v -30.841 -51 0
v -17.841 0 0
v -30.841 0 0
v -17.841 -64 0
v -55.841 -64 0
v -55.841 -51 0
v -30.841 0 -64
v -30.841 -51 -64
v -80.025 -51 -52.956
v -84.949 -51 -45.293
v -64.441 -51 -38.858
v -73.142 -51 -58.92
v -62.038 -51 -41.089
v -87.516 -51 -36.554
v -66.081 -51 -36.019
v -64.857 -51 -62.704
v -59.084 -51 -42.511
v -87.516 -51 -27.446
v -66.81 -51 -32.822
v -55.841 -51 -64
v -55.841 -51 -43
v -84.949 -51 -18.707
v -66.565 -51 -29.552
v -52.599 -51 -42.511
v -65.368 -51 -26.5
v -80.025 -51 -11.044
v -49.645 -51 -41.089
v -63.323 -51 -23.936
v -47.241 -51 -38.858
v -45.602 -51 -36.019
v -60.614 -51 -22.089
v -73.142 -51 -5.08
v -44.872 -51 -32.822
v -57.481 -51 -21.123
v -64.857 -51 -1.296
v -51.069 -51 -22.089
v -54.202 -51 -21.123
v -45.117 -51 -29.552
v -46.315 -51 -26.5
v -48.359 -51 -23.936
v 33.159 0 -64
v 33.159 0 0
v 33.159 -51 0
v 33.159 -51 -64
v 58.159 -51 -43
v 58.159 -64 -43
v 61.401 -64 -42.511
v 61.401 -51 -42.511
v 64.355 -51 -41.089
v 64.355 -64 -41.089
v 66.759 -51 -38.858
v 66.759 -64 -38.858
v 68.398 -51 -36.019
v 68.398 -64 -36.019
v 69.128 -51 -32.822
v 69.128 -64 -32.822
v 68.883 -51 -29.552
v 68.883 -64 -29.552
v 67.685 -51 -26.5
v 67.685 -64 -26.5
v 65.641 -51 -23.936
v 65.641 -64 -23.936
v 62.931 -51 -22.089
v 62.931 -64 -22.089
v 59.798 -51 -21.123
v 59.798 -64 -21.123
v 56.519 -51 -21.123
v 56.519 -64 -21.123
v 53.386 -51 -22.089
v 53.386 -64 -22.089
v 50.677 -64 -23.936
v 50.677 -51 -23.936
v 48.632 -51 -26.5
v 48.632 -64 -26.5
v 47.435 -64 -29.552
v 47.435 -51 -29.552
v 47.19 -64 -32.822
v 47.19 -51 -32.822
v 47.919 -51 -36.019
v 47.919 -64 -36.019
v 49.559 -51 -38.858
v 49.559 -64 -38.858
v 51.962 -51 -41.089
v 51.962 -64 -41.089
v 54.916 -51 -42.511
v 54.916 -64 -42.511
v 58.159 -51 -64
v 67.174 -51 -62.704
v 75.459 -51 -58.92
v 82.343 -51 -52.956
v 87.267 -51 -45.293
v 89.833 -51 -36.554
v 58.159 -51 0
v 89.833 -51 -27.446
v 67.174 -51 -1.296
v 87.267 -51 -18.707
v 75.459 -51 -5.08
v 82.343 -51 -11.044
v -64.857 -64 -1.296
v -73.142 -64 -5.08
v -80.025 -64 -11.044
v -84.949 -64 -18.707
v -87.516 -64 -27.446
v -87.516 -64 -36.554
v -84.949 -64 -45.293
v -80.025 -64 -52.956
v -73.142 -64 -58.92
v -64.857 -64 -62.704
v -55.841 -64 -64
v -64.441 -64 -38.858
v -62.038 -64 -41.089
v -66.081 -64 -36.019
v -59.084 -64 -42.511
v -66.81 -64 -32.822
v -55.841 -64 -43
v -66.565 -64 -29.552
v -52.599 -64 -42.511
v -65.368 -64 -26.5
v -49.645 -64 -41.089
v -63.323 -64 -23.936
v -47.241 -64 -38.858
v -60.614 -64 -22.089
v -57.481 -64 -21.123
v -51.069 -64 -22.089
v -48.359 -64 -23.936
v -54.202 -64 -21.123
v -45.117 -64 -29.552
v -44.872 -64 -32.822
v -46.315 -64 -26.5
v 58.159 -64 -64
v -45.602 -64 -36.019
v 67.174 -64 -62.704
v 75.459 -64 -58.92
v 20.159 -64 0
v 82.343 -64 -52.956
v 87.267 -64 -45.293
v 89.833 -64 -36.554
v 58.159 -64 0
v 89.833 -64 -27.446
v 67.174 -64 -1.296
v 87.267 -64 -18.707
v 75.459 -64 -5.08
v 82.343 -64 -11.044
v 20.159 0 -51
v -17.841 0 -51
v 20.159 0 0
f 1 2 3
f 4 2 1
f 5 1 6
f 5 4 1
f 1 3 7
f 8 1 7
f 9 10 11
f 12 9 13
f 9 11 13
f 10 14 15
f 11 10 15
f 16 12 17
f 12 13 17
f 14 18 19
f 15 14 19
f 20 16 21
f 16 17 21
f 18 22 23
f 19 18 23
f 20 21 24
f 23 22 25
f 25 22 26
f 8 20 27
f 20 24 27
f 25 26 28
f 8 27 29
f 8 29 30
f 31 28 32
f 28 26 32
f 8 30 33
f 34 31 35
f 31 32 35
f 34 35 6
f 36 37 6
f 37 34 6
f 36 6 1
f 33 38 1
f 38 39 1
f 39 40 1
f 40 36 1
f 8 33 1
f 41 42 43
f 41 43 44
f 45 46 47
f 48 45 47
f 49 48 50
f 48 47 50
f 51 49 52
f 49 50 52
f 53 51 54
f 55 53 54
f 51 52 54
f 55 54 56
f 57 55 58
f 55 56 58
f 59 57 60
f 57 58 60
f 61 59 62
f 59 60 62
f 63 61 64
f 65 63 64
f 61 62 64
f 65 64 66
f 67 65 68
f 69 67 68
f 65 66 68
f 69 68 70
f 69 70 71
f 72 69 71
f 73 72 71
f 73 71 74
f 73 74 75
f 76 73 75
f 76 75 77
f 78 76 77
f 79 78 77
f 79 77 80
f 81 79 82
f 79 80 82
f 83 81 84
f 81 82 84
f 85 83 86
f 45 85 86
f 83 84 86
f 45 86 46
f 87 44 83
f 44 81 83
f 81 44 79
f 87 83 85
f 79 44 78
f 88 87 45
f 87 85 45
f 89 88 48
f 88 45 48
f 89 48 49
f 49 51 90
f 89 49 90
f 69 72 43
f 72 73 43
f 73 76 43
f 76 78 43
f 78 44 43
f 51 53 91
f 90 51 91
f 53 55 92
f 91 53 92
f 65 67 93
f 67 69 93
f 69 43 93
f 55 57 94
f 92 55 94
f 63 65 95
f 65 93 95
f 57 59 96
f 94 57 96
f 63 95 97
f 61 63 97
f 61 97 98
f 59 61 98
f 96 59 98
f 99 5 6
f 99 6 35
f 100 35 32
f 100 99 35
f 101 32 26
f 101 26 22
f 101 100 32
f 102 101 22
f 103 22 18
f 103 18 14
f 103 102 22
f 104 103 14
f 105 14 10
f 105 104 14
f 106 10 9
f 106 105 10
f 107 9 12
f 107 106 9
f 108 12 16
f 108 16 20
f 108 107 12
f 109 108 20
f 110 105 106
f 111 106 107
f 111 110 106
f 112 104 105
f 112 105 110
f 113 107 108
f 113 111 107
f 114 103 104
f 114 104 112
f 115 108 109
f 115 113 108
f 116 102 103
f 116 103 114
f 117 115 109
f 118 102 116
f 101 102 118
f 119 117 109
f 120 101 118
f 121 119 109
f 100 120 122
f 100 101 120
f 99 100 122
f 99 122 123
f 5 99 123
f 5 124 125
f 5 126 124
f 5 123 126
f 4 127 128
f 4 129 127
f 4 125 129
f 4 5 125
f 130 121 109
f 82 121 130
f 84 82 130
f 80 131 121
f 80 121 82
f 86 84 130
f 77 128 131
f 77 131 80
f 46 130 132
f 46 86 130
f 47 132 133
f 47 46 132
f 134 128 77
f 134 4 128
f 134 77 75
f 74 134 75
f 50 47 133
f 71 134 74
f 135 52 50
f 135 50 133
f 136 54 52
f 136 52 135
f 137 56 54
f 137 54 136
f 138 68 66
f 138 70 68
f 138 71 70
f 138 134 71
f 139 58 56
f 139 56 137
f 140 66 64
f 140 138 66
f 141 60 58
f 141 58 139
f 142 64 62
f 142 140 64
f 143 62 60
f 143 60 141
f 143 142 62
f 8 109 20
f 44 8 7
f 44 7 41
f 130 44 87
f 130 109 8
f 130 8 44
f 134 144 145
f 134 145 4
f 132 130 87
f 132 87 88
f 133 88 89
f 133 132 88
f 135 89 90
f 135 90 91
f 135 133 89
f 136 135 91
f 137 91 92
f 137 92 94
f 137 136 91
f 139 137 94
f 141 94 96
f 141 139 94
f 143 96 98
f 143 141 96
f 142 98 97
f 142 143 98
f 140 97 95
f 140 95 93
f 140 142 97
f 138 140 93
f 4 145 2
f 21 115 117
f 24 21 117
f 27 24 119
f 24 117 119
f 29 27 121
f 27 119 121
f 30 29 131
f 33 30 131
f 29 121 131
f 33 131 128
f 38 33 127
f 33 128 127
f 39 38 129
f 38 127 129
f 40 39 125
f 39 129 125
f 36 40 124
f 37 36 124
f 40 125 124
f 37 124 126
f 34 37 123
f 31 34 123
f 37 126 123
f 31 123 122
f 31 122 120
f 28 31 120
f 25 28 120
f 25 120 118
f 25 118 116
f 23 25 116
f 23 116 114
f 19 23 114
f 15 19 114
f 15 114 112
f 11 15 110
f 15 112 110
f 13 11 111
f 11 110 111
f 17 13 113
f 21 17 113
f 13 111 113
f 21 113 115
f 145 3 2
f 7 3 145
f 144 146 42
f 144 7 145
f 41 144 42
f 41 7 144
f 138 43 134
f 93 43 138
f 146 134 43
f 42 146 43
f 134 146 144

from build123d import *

# Parameters (mm, degrees)
SKETCH1_W               = 64
SKETCH1_H               = 64
BOSS_EXTRUDE1_DEPTH     = 64
CUT_EXTRUDE2_DEPTH      = 97.392449486
CUT_EXTRUDE2_DEPTH_BACK = 64
BOSS_EXTRUDE3_DEPTH     = 64
SKETCH10_R              = 11
BOSS_EXTRUDE4_DEPTH     = 13


with BuildPart() as part:
    # Sketch1 → Boss-Extrude1 (new body)
    with BuildSketch(Plane(origin=(0, 0, 0), x_dir=(1, 0, 0), z_dir=(0, 1, 0))):
        with Locations((1.158774373, 32)):
            Rectangle(SKETCH1_W, SKETCH1_H)
    extrude(amount=-BOSS_EXTRUDE1_DEPTH)

    # Sketch4 → Cut-Extrude2 (cut, two sides: drawn at the far end of the back side and taken through both)
    with BuildSketch(Plane(origin=(0, 0, 0), x_dir=(1, 0, 0), z_dir=(0, 1, 0)).offset(-CUT_EXTRUDE2_DEPTH_BACK)):
        Polygon((20.158774373, -173.670400501), (20.158774373, 0), (20.158774373, 51), (-17.841225627, 51), (-17.841225627, 0), (-17.841225627, -173.670400501), (-17.841225627, -521.011201502), (20.158774373, -521.011201502), align=None)
    extrude(amount=CUT_EXTRUDE2_DEPTH + CUT_EXTRUDE2_DEPTH_BACK, mode=Mode.SUBTRACT)

    # Sketch8 → Boss-Extrude3 (add)
    with BuildSketch(Plane(origin=(33.158774373, 0, 0), x_dir=(0, 0, -1), z_dir=(1, 0, 0))):
        Polygon((51, 0), (0, -64), (51, -64), align=None)
    extrude(amount=-BOSS_EXTRUDE3_DEPTH)

    # Sketch10 → Boss-Extrude4 (add)
    # profile 1 of 2: a face of its own
    with BuildSketch(Plane.XZ.offset(64)):
        with BuildLine():
            Line((-30.841225627, 0), (-55.841225627, 0))
            ThreePointArc((-55.841225627, 0), (-87.841225627, -32), (-55.841225627, -64))
            Line((-55.841225627, -64), (-30.841225627, -64))
            Line((-30.841225627, -64), (-30.841225627, 0))
        make_face()
        with Locations(Location((-55.841225627, -32, 0), (0, 0, 270))):
            Circle(SKETCH10_R, mode=Mode.SUBTRACT)
    # profile 2 of 2: a face of its own
    with BuildSketch(Plane.XZ.offset(64)):
        with BuildLine():
            Line((33.158774373, -64), (58.158774373, -64))
            ThreePointArc((58.158774373, -64), (90.158774373, -32), (58.158774373, 0))
            Line((58.158774373, 0), (33.158774373, 0))
            Line((33.158774373, 0), (33.158774373, -64))
        make_face()
        with Locations(Location((58.158774373, -32, 0), (0, 0, 270))):
            Circle(SKETCH10_R, mode=Mode.SUBTRACT)
    extrude(amount=-BOSS_EXTRUDE4_DEPTH)


solid = part.part
